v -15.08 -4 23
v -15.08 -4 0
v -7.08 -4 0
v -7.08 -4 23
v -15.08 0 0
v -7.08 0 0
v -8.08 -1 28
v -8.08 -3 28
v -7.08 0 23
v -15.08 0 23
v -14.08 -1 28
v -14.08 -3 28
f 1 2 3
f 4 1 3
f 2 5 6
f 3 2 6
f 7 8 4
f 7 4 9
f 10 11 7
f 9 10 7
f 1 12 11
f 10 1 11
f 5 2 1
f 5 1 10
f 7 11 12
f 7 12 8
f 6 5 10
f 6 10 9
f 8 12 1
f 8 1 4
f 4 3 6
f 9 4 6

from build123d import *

# Parameters (mm, degrees)
F0_W     = 8
F0_H     = 4
F1_DEPTH = 28
F2_SIZE2 = 1
F2_SIZE  = 5


with BuildPart() as f1:
    # F0 (on Top) → F1 (new body)
    with BuildSketch(Plane.XY):
        with Locations((-11.080092, -2)):
            Rectangle(F0_W, F0_H)
    extrude(amount=F1_DEPTH)

    # F2
    f2_edges = [f1.edges().sort_by_distance(p)[0] for p in [
        (-11.080092, 0, 28),
        (-11.080092, -4, 28),
        (-7.080092, -2, 28),
        (-15.080092, -2, 28),
    ]]
    chamfer(f2_edges, length=F2_SIZE, length2=F2_SIZE2)


solid = f1.part
